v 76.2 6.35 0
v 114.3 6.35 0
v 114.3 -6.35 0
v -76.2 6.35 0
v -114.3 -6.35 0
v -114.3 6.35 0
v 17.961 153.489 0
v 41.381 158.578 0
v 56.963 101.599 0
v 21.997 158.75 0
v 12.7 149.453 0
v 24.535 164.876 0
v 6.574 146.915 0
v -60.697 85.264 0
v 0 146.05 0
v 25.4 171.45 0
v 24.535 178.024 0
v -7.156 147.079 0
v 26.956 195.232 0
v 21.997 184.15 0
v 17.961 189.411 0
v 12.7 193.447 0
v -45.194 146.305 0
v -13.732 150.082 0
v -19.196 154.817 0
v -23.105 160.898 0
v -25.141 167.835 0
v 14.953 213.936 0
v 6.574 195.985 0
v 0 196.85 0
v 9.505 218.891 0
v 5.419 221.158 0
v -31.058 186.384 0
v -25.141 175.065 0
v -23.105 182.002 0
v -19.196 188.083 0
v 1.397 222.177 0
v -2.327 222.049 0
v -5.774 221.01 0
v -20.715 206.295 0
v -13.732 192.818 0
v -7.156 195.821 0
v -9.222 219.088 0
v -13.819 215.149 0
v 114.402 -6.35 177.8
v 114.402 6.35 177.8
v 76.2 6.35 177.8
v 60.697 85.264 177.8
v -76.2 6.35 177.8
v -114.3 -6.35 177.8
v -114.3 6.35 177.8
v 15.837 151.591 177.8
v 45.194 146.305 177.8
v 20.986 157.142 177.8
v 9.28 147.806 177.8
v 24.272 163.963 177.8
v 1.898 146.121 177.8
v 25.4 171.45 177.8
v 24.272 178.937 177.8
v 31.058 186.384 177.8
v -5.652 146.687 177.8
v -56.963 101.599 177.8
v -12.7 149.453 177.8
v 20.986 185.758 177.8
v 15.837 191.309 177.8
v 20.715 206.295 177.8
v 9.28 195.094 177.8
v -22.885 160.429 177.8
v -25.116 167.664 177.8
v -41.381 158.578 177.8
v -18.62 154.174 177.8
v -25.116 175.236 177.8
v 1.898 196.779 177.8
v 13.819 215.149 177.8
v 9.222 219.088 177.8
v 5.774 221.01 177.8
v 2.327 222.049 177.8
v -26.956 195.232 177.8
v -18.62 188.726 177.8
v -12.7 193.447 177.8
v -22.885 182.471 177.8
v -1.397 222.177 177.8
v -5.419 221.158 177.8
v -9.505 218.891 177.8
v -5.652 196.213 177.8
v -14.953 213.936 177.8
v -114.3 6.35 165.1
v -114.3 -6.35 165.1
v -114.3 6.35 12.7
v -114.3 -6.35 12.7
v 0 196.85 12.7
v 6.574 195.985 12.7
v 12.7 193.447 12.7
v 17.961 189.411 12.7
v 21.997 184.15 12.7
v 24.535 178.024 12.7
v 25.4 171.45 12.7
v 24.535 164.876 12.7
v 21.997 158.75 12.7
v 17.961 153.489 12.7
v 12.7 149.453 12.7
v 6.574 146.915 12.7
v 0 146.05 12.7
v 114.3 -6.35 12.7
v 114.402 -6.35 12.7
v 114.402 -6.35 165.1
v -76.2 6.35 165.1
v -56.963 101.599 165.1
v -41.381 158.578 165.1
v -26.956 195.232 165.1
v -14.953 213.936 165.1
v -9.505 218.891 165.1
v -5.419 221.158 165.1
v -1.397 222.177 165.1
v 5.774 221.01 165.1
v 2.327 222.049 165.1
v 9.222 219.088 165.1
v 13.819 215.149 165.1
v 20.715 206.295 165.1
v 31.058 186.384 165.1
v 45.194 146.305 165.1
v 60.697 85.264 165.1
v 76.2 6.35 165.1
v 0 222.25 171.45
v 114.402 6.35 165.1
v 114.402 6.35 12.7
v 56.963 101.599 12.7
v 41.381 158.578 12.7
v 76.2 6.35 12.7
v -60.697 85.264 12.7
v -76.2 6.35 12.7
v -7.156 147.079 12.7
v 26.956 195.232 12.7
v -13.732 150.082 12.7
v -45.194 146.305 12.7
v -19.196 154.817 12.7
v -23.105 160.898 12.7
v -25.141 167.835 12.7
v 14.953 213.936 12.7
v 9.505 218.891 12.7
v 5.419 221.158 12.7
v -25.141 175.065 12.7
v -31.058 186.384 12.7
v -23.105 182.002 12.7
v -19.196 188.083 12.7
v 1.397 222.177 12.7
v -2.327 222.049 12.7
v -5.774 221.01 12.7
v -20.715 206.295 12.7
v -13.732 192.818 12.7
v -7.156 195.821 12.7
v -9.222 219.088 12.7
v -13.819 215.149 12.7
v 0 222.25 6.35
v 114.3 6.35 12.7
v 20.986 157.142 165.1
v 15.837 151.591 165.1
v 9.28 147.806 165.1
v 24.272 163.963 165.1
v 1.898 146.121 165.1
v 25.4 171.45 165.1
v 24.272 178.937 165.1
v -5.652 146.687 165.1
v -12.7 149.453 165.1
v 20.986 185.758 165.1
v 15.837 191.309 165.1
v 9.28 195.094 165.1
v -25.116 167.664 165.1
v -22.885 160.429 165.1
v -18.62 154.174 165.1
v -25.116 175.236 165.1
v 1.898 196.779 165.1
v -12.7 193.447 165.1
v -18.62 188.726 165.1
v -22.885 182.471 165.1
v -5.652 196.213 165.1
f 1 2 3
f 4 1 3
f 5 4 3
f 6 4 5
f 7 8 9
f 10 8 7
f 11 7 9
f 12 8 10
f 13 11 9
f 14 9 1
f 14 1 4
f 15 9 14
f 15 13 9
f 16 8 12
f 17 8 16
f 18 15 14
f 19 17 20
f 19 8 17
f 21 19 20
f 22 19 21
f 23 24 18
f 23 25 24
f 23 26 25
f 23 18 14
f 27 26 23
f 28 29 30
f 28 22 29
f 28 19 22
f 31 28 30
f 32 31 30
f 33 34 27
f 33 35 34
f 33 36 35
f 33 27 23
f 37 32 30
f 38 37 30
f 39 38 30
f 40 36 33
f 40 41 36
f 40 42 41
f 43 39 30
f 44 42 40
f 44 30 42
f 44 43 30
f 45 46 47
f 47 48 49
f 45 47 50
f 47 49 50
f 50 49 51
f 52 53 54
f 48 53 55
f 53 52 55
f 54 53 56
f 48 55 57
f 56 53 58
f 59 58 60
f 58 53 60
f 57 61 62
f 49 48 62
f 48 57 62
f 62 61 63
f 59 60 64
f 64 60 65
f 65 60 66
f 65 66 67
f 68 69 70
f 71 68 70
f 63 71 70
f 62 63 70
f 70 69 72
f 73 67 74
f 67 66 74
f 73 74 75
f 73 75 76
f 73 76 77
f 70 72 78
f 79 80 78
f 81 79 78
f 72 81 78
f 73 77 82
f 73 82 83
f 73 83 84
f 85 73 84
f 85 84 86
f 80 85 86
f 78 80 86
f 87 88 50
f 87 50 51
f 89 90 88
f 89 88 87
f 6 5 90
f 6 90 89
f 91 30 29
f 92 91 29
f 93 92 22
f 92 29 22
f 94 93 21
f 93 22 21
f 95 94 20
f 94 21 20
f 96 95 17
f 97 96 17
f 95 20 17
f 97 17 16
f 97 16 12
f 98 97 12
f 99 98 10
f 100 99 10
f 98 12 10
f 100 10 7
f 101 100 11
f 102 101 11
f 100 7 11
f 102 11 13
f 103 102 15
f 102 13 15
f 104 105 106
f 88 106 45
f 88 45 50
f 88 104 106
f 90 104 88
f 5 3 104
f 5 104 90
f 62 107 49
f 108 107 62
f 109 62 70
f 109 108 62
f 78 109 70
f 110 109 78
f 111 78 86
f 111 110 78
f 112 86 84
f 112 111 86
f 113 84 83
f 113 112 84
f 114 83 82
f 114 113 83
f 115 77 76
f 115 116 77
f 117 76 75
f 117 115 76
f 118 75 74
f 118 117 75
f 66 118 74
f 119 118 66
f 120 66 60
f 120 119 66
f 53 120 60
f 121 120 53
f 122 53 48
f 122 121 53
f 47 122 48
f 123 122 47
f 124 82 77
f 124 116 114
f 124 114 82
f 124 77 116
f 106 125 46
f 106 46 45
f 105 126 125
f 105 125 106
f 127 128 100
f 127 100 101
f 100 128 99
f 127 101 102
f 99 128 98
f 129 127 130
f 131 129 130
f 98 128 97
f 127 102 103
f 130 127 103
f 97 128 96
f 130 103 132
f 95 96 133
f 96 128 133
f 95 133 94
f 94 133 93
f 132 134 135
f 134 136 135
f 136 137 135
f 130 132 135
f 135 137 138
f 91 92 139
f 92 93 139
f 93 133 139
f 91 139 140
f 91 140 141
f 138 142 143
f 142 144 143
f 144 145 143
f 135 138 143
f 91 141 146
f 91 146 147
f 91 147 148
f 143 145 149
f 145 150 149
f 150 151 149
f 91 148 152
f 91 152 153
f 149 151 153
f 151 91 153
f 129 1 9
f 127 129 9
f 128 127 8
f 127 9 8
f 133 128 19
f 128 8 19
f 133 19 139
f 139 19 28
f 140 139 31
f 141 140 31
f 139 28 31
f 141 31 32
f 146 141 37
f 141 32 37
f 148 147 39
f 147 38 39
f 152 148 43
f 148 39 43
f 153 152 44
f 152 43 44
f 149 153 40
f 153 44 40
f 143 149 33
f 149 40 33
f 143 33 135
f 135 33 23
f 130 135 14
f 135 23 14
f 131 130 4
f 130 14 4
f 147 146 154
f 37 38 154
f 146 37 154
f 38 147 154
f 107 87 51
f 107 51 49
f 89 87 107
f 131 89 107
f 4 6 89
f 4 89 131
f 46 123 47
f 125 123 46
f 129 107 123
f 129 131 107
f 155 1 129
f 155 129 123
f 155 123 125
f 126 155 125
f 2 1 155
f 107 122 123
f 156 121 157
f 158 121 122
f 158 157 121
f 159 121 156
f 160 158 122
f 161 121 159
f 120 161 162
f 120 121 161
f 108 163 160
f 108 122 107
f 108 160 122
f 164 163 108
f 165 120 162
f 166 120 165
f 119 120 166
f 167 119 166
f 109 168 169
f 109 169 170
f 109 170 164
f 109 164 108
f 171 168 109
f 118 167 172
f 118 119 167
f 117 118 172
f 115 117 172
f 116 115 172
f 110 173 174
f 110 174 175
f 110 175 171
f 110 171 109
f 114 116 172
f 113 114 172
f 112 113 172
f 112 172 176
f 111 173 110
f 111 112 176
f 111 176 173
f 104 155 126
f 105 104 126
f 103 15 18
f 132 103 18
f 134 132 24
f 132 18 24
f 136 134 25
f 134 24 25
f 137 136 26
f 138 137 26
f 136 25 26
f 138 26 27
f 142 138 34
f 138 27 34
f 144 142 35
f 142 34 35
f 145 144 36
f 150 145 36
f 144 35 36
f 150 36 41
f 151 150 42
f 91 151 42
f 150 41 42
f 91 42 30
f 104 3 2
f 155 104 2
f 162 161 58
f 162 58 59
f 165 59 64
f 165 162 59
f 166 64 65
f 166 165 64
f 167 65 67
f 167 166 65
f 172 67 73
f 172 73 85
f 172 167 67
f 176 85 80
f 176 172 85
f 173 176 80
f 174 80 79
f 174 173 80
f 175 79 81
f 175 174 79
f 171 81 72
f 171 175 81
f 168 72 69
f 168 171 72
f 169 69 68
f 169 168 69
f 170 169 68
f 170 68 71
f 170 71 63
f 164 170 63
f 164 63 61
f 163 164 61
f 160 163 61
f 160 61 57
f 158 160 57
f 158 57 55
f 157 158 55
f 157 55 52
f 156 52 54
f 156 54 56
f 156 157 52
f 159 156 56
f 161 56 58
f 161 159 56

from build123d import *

# Parameters (mm, degrees)
SKETCH2_W           = 38.1
SKETCH2_H           = 12.7
BOSS_EXTRUDE1_DEPTH = 12.7
SKETCH4_W           = 228.702019181
SKETCH4_H           = 12.7
BOSS_EXTRUDE2_DEPTH = 152.4
SKETCH5_R           = 25.4
BOSS_EXTRUDE3_DEPTH = 12.7


with BuildPart() as part:
    # Sketch2 → Boss-Extrude1 (new body)
    with BuildSketch(Plane.XY):
        with BuildLine():
            add(Edge.make_bspline(
                [(-76.2, 6.35), (-38.1, 222.25), (0, 222.25)],
                knots=[0, 0, 0, 0.5, 0.5, 0.5], degree=2))
            Line((-76.2, 6.35), (-50.8, 6.35))
            Line((-50.8, 6.35), (0, 6.35))
            Line((0, 6.35), (0, 19.05))
            Line((0, 19.05), (0, 146.05))
            ThreePointArc((0, 146.05), (-25.4, 171.45), (0, 196.85))
            Line((0, 196.85), (0, 222.25))
        make_face()
        with BuildLine():
            add(Edge.make_bspline(
                [(-76.2, 6.35), (-38.1, 222.25), (0, 222.25)],
                knots=[0, 0, 0, 0.5, 0.5, 0.5], degree=2))
            Line((-76.2, 6.35), (-50.8, 6.35))
            Line((-50.8, 6.35), (0, 6.35))
            Line((0, 6.35), (0, 19.05))
            Line((0, 19.05), (0, 146.05))
            ThreePointArc((0, 146.05), (-25.4, 171.45), (0, 196.85))
            Line((0, 196.85), (0, 222.25))
        make_face()
        with BuildLine():
            add(Edge.make_bspline(
                [(0, 222.25), (38.1, 222.25), (76.2, 6.35)],
                knots=[0.5, 0.5, 0.5, 1, 1, 1], degree=2))
            Line((0, 222.25), (0, 196.85))
            ThreePointArc((0, 196.85), (17.960512242, 189.410512242), (25.4, 171.45))
            ThreePointArc((25.4, 171.45), (17.960512242, 153.489487758), (0, 146.05))
            Line((0, 146.05), (0, 19.05))
            Line((0, 19.05), (0, 6.35))
            Line((0, 6.35), (50.8, 6.35))
            Line((50.8, 6.35), (76.2, 6.35))
        make_face()
        with Locations((-95.25, 0)):
            Rectangle(SKETCH2_W, SKETCH2_H)
        Polygon((-50.8, 6.35), (-76.2, 6.35), (-76.2, -6.35), (76.2, -6.35), (76.2, 6.35), (50.8, 6.35), (0, 6.35), align=None)
        with Locations((95.25, 0)):
            Rectangle(SKETCH2_W, SKETCH2_H)
    extrude(amount=BOSS_EXTRUDE1_DEPTH)

    # Sketch4 → Boss-Extrude2 (add)
    with BuildSketch(Plane.XY.offset(12.7)):
        with Locations((0.051009591, 0)):
            Rectangle(SKETCH4_W, SKETCH4_H)
    extrude(amount=BOSS_EXTRUDE2_DEPTH)

    # Sketch5 → Boss-Extrude3 (add)
    with BuildSketch(Plane.XY.offset(165.1)):
        with BuildLine():
            Line((76.2, 6.35), (114.402019181, 6.35))
            Line((114.402019181, 6.35), (114.402019181, -6.35))
            Line((114.402019181, -6.35), (-114.3, -6.35))
            Line((-114.3, -6.35), (-114.3, 6.35))
            Line((-114.3, 6.35), (-76.2, 6.35))
            add(Edge.make_bspline(
                [(-76.2, 6.35), (0, 438.15), (76.2, 6.35)],
                knots=[0, 0, 0, 1, 1, 1], degree=2))
        make_face()
        with Locations((0, 171.45)):
            Circle(SKETCH5_R, mode=Mode.SUBTRACT)
    extrude(amount=BOSS_EXTRUDE3_DEPTH)


solid = part.part
